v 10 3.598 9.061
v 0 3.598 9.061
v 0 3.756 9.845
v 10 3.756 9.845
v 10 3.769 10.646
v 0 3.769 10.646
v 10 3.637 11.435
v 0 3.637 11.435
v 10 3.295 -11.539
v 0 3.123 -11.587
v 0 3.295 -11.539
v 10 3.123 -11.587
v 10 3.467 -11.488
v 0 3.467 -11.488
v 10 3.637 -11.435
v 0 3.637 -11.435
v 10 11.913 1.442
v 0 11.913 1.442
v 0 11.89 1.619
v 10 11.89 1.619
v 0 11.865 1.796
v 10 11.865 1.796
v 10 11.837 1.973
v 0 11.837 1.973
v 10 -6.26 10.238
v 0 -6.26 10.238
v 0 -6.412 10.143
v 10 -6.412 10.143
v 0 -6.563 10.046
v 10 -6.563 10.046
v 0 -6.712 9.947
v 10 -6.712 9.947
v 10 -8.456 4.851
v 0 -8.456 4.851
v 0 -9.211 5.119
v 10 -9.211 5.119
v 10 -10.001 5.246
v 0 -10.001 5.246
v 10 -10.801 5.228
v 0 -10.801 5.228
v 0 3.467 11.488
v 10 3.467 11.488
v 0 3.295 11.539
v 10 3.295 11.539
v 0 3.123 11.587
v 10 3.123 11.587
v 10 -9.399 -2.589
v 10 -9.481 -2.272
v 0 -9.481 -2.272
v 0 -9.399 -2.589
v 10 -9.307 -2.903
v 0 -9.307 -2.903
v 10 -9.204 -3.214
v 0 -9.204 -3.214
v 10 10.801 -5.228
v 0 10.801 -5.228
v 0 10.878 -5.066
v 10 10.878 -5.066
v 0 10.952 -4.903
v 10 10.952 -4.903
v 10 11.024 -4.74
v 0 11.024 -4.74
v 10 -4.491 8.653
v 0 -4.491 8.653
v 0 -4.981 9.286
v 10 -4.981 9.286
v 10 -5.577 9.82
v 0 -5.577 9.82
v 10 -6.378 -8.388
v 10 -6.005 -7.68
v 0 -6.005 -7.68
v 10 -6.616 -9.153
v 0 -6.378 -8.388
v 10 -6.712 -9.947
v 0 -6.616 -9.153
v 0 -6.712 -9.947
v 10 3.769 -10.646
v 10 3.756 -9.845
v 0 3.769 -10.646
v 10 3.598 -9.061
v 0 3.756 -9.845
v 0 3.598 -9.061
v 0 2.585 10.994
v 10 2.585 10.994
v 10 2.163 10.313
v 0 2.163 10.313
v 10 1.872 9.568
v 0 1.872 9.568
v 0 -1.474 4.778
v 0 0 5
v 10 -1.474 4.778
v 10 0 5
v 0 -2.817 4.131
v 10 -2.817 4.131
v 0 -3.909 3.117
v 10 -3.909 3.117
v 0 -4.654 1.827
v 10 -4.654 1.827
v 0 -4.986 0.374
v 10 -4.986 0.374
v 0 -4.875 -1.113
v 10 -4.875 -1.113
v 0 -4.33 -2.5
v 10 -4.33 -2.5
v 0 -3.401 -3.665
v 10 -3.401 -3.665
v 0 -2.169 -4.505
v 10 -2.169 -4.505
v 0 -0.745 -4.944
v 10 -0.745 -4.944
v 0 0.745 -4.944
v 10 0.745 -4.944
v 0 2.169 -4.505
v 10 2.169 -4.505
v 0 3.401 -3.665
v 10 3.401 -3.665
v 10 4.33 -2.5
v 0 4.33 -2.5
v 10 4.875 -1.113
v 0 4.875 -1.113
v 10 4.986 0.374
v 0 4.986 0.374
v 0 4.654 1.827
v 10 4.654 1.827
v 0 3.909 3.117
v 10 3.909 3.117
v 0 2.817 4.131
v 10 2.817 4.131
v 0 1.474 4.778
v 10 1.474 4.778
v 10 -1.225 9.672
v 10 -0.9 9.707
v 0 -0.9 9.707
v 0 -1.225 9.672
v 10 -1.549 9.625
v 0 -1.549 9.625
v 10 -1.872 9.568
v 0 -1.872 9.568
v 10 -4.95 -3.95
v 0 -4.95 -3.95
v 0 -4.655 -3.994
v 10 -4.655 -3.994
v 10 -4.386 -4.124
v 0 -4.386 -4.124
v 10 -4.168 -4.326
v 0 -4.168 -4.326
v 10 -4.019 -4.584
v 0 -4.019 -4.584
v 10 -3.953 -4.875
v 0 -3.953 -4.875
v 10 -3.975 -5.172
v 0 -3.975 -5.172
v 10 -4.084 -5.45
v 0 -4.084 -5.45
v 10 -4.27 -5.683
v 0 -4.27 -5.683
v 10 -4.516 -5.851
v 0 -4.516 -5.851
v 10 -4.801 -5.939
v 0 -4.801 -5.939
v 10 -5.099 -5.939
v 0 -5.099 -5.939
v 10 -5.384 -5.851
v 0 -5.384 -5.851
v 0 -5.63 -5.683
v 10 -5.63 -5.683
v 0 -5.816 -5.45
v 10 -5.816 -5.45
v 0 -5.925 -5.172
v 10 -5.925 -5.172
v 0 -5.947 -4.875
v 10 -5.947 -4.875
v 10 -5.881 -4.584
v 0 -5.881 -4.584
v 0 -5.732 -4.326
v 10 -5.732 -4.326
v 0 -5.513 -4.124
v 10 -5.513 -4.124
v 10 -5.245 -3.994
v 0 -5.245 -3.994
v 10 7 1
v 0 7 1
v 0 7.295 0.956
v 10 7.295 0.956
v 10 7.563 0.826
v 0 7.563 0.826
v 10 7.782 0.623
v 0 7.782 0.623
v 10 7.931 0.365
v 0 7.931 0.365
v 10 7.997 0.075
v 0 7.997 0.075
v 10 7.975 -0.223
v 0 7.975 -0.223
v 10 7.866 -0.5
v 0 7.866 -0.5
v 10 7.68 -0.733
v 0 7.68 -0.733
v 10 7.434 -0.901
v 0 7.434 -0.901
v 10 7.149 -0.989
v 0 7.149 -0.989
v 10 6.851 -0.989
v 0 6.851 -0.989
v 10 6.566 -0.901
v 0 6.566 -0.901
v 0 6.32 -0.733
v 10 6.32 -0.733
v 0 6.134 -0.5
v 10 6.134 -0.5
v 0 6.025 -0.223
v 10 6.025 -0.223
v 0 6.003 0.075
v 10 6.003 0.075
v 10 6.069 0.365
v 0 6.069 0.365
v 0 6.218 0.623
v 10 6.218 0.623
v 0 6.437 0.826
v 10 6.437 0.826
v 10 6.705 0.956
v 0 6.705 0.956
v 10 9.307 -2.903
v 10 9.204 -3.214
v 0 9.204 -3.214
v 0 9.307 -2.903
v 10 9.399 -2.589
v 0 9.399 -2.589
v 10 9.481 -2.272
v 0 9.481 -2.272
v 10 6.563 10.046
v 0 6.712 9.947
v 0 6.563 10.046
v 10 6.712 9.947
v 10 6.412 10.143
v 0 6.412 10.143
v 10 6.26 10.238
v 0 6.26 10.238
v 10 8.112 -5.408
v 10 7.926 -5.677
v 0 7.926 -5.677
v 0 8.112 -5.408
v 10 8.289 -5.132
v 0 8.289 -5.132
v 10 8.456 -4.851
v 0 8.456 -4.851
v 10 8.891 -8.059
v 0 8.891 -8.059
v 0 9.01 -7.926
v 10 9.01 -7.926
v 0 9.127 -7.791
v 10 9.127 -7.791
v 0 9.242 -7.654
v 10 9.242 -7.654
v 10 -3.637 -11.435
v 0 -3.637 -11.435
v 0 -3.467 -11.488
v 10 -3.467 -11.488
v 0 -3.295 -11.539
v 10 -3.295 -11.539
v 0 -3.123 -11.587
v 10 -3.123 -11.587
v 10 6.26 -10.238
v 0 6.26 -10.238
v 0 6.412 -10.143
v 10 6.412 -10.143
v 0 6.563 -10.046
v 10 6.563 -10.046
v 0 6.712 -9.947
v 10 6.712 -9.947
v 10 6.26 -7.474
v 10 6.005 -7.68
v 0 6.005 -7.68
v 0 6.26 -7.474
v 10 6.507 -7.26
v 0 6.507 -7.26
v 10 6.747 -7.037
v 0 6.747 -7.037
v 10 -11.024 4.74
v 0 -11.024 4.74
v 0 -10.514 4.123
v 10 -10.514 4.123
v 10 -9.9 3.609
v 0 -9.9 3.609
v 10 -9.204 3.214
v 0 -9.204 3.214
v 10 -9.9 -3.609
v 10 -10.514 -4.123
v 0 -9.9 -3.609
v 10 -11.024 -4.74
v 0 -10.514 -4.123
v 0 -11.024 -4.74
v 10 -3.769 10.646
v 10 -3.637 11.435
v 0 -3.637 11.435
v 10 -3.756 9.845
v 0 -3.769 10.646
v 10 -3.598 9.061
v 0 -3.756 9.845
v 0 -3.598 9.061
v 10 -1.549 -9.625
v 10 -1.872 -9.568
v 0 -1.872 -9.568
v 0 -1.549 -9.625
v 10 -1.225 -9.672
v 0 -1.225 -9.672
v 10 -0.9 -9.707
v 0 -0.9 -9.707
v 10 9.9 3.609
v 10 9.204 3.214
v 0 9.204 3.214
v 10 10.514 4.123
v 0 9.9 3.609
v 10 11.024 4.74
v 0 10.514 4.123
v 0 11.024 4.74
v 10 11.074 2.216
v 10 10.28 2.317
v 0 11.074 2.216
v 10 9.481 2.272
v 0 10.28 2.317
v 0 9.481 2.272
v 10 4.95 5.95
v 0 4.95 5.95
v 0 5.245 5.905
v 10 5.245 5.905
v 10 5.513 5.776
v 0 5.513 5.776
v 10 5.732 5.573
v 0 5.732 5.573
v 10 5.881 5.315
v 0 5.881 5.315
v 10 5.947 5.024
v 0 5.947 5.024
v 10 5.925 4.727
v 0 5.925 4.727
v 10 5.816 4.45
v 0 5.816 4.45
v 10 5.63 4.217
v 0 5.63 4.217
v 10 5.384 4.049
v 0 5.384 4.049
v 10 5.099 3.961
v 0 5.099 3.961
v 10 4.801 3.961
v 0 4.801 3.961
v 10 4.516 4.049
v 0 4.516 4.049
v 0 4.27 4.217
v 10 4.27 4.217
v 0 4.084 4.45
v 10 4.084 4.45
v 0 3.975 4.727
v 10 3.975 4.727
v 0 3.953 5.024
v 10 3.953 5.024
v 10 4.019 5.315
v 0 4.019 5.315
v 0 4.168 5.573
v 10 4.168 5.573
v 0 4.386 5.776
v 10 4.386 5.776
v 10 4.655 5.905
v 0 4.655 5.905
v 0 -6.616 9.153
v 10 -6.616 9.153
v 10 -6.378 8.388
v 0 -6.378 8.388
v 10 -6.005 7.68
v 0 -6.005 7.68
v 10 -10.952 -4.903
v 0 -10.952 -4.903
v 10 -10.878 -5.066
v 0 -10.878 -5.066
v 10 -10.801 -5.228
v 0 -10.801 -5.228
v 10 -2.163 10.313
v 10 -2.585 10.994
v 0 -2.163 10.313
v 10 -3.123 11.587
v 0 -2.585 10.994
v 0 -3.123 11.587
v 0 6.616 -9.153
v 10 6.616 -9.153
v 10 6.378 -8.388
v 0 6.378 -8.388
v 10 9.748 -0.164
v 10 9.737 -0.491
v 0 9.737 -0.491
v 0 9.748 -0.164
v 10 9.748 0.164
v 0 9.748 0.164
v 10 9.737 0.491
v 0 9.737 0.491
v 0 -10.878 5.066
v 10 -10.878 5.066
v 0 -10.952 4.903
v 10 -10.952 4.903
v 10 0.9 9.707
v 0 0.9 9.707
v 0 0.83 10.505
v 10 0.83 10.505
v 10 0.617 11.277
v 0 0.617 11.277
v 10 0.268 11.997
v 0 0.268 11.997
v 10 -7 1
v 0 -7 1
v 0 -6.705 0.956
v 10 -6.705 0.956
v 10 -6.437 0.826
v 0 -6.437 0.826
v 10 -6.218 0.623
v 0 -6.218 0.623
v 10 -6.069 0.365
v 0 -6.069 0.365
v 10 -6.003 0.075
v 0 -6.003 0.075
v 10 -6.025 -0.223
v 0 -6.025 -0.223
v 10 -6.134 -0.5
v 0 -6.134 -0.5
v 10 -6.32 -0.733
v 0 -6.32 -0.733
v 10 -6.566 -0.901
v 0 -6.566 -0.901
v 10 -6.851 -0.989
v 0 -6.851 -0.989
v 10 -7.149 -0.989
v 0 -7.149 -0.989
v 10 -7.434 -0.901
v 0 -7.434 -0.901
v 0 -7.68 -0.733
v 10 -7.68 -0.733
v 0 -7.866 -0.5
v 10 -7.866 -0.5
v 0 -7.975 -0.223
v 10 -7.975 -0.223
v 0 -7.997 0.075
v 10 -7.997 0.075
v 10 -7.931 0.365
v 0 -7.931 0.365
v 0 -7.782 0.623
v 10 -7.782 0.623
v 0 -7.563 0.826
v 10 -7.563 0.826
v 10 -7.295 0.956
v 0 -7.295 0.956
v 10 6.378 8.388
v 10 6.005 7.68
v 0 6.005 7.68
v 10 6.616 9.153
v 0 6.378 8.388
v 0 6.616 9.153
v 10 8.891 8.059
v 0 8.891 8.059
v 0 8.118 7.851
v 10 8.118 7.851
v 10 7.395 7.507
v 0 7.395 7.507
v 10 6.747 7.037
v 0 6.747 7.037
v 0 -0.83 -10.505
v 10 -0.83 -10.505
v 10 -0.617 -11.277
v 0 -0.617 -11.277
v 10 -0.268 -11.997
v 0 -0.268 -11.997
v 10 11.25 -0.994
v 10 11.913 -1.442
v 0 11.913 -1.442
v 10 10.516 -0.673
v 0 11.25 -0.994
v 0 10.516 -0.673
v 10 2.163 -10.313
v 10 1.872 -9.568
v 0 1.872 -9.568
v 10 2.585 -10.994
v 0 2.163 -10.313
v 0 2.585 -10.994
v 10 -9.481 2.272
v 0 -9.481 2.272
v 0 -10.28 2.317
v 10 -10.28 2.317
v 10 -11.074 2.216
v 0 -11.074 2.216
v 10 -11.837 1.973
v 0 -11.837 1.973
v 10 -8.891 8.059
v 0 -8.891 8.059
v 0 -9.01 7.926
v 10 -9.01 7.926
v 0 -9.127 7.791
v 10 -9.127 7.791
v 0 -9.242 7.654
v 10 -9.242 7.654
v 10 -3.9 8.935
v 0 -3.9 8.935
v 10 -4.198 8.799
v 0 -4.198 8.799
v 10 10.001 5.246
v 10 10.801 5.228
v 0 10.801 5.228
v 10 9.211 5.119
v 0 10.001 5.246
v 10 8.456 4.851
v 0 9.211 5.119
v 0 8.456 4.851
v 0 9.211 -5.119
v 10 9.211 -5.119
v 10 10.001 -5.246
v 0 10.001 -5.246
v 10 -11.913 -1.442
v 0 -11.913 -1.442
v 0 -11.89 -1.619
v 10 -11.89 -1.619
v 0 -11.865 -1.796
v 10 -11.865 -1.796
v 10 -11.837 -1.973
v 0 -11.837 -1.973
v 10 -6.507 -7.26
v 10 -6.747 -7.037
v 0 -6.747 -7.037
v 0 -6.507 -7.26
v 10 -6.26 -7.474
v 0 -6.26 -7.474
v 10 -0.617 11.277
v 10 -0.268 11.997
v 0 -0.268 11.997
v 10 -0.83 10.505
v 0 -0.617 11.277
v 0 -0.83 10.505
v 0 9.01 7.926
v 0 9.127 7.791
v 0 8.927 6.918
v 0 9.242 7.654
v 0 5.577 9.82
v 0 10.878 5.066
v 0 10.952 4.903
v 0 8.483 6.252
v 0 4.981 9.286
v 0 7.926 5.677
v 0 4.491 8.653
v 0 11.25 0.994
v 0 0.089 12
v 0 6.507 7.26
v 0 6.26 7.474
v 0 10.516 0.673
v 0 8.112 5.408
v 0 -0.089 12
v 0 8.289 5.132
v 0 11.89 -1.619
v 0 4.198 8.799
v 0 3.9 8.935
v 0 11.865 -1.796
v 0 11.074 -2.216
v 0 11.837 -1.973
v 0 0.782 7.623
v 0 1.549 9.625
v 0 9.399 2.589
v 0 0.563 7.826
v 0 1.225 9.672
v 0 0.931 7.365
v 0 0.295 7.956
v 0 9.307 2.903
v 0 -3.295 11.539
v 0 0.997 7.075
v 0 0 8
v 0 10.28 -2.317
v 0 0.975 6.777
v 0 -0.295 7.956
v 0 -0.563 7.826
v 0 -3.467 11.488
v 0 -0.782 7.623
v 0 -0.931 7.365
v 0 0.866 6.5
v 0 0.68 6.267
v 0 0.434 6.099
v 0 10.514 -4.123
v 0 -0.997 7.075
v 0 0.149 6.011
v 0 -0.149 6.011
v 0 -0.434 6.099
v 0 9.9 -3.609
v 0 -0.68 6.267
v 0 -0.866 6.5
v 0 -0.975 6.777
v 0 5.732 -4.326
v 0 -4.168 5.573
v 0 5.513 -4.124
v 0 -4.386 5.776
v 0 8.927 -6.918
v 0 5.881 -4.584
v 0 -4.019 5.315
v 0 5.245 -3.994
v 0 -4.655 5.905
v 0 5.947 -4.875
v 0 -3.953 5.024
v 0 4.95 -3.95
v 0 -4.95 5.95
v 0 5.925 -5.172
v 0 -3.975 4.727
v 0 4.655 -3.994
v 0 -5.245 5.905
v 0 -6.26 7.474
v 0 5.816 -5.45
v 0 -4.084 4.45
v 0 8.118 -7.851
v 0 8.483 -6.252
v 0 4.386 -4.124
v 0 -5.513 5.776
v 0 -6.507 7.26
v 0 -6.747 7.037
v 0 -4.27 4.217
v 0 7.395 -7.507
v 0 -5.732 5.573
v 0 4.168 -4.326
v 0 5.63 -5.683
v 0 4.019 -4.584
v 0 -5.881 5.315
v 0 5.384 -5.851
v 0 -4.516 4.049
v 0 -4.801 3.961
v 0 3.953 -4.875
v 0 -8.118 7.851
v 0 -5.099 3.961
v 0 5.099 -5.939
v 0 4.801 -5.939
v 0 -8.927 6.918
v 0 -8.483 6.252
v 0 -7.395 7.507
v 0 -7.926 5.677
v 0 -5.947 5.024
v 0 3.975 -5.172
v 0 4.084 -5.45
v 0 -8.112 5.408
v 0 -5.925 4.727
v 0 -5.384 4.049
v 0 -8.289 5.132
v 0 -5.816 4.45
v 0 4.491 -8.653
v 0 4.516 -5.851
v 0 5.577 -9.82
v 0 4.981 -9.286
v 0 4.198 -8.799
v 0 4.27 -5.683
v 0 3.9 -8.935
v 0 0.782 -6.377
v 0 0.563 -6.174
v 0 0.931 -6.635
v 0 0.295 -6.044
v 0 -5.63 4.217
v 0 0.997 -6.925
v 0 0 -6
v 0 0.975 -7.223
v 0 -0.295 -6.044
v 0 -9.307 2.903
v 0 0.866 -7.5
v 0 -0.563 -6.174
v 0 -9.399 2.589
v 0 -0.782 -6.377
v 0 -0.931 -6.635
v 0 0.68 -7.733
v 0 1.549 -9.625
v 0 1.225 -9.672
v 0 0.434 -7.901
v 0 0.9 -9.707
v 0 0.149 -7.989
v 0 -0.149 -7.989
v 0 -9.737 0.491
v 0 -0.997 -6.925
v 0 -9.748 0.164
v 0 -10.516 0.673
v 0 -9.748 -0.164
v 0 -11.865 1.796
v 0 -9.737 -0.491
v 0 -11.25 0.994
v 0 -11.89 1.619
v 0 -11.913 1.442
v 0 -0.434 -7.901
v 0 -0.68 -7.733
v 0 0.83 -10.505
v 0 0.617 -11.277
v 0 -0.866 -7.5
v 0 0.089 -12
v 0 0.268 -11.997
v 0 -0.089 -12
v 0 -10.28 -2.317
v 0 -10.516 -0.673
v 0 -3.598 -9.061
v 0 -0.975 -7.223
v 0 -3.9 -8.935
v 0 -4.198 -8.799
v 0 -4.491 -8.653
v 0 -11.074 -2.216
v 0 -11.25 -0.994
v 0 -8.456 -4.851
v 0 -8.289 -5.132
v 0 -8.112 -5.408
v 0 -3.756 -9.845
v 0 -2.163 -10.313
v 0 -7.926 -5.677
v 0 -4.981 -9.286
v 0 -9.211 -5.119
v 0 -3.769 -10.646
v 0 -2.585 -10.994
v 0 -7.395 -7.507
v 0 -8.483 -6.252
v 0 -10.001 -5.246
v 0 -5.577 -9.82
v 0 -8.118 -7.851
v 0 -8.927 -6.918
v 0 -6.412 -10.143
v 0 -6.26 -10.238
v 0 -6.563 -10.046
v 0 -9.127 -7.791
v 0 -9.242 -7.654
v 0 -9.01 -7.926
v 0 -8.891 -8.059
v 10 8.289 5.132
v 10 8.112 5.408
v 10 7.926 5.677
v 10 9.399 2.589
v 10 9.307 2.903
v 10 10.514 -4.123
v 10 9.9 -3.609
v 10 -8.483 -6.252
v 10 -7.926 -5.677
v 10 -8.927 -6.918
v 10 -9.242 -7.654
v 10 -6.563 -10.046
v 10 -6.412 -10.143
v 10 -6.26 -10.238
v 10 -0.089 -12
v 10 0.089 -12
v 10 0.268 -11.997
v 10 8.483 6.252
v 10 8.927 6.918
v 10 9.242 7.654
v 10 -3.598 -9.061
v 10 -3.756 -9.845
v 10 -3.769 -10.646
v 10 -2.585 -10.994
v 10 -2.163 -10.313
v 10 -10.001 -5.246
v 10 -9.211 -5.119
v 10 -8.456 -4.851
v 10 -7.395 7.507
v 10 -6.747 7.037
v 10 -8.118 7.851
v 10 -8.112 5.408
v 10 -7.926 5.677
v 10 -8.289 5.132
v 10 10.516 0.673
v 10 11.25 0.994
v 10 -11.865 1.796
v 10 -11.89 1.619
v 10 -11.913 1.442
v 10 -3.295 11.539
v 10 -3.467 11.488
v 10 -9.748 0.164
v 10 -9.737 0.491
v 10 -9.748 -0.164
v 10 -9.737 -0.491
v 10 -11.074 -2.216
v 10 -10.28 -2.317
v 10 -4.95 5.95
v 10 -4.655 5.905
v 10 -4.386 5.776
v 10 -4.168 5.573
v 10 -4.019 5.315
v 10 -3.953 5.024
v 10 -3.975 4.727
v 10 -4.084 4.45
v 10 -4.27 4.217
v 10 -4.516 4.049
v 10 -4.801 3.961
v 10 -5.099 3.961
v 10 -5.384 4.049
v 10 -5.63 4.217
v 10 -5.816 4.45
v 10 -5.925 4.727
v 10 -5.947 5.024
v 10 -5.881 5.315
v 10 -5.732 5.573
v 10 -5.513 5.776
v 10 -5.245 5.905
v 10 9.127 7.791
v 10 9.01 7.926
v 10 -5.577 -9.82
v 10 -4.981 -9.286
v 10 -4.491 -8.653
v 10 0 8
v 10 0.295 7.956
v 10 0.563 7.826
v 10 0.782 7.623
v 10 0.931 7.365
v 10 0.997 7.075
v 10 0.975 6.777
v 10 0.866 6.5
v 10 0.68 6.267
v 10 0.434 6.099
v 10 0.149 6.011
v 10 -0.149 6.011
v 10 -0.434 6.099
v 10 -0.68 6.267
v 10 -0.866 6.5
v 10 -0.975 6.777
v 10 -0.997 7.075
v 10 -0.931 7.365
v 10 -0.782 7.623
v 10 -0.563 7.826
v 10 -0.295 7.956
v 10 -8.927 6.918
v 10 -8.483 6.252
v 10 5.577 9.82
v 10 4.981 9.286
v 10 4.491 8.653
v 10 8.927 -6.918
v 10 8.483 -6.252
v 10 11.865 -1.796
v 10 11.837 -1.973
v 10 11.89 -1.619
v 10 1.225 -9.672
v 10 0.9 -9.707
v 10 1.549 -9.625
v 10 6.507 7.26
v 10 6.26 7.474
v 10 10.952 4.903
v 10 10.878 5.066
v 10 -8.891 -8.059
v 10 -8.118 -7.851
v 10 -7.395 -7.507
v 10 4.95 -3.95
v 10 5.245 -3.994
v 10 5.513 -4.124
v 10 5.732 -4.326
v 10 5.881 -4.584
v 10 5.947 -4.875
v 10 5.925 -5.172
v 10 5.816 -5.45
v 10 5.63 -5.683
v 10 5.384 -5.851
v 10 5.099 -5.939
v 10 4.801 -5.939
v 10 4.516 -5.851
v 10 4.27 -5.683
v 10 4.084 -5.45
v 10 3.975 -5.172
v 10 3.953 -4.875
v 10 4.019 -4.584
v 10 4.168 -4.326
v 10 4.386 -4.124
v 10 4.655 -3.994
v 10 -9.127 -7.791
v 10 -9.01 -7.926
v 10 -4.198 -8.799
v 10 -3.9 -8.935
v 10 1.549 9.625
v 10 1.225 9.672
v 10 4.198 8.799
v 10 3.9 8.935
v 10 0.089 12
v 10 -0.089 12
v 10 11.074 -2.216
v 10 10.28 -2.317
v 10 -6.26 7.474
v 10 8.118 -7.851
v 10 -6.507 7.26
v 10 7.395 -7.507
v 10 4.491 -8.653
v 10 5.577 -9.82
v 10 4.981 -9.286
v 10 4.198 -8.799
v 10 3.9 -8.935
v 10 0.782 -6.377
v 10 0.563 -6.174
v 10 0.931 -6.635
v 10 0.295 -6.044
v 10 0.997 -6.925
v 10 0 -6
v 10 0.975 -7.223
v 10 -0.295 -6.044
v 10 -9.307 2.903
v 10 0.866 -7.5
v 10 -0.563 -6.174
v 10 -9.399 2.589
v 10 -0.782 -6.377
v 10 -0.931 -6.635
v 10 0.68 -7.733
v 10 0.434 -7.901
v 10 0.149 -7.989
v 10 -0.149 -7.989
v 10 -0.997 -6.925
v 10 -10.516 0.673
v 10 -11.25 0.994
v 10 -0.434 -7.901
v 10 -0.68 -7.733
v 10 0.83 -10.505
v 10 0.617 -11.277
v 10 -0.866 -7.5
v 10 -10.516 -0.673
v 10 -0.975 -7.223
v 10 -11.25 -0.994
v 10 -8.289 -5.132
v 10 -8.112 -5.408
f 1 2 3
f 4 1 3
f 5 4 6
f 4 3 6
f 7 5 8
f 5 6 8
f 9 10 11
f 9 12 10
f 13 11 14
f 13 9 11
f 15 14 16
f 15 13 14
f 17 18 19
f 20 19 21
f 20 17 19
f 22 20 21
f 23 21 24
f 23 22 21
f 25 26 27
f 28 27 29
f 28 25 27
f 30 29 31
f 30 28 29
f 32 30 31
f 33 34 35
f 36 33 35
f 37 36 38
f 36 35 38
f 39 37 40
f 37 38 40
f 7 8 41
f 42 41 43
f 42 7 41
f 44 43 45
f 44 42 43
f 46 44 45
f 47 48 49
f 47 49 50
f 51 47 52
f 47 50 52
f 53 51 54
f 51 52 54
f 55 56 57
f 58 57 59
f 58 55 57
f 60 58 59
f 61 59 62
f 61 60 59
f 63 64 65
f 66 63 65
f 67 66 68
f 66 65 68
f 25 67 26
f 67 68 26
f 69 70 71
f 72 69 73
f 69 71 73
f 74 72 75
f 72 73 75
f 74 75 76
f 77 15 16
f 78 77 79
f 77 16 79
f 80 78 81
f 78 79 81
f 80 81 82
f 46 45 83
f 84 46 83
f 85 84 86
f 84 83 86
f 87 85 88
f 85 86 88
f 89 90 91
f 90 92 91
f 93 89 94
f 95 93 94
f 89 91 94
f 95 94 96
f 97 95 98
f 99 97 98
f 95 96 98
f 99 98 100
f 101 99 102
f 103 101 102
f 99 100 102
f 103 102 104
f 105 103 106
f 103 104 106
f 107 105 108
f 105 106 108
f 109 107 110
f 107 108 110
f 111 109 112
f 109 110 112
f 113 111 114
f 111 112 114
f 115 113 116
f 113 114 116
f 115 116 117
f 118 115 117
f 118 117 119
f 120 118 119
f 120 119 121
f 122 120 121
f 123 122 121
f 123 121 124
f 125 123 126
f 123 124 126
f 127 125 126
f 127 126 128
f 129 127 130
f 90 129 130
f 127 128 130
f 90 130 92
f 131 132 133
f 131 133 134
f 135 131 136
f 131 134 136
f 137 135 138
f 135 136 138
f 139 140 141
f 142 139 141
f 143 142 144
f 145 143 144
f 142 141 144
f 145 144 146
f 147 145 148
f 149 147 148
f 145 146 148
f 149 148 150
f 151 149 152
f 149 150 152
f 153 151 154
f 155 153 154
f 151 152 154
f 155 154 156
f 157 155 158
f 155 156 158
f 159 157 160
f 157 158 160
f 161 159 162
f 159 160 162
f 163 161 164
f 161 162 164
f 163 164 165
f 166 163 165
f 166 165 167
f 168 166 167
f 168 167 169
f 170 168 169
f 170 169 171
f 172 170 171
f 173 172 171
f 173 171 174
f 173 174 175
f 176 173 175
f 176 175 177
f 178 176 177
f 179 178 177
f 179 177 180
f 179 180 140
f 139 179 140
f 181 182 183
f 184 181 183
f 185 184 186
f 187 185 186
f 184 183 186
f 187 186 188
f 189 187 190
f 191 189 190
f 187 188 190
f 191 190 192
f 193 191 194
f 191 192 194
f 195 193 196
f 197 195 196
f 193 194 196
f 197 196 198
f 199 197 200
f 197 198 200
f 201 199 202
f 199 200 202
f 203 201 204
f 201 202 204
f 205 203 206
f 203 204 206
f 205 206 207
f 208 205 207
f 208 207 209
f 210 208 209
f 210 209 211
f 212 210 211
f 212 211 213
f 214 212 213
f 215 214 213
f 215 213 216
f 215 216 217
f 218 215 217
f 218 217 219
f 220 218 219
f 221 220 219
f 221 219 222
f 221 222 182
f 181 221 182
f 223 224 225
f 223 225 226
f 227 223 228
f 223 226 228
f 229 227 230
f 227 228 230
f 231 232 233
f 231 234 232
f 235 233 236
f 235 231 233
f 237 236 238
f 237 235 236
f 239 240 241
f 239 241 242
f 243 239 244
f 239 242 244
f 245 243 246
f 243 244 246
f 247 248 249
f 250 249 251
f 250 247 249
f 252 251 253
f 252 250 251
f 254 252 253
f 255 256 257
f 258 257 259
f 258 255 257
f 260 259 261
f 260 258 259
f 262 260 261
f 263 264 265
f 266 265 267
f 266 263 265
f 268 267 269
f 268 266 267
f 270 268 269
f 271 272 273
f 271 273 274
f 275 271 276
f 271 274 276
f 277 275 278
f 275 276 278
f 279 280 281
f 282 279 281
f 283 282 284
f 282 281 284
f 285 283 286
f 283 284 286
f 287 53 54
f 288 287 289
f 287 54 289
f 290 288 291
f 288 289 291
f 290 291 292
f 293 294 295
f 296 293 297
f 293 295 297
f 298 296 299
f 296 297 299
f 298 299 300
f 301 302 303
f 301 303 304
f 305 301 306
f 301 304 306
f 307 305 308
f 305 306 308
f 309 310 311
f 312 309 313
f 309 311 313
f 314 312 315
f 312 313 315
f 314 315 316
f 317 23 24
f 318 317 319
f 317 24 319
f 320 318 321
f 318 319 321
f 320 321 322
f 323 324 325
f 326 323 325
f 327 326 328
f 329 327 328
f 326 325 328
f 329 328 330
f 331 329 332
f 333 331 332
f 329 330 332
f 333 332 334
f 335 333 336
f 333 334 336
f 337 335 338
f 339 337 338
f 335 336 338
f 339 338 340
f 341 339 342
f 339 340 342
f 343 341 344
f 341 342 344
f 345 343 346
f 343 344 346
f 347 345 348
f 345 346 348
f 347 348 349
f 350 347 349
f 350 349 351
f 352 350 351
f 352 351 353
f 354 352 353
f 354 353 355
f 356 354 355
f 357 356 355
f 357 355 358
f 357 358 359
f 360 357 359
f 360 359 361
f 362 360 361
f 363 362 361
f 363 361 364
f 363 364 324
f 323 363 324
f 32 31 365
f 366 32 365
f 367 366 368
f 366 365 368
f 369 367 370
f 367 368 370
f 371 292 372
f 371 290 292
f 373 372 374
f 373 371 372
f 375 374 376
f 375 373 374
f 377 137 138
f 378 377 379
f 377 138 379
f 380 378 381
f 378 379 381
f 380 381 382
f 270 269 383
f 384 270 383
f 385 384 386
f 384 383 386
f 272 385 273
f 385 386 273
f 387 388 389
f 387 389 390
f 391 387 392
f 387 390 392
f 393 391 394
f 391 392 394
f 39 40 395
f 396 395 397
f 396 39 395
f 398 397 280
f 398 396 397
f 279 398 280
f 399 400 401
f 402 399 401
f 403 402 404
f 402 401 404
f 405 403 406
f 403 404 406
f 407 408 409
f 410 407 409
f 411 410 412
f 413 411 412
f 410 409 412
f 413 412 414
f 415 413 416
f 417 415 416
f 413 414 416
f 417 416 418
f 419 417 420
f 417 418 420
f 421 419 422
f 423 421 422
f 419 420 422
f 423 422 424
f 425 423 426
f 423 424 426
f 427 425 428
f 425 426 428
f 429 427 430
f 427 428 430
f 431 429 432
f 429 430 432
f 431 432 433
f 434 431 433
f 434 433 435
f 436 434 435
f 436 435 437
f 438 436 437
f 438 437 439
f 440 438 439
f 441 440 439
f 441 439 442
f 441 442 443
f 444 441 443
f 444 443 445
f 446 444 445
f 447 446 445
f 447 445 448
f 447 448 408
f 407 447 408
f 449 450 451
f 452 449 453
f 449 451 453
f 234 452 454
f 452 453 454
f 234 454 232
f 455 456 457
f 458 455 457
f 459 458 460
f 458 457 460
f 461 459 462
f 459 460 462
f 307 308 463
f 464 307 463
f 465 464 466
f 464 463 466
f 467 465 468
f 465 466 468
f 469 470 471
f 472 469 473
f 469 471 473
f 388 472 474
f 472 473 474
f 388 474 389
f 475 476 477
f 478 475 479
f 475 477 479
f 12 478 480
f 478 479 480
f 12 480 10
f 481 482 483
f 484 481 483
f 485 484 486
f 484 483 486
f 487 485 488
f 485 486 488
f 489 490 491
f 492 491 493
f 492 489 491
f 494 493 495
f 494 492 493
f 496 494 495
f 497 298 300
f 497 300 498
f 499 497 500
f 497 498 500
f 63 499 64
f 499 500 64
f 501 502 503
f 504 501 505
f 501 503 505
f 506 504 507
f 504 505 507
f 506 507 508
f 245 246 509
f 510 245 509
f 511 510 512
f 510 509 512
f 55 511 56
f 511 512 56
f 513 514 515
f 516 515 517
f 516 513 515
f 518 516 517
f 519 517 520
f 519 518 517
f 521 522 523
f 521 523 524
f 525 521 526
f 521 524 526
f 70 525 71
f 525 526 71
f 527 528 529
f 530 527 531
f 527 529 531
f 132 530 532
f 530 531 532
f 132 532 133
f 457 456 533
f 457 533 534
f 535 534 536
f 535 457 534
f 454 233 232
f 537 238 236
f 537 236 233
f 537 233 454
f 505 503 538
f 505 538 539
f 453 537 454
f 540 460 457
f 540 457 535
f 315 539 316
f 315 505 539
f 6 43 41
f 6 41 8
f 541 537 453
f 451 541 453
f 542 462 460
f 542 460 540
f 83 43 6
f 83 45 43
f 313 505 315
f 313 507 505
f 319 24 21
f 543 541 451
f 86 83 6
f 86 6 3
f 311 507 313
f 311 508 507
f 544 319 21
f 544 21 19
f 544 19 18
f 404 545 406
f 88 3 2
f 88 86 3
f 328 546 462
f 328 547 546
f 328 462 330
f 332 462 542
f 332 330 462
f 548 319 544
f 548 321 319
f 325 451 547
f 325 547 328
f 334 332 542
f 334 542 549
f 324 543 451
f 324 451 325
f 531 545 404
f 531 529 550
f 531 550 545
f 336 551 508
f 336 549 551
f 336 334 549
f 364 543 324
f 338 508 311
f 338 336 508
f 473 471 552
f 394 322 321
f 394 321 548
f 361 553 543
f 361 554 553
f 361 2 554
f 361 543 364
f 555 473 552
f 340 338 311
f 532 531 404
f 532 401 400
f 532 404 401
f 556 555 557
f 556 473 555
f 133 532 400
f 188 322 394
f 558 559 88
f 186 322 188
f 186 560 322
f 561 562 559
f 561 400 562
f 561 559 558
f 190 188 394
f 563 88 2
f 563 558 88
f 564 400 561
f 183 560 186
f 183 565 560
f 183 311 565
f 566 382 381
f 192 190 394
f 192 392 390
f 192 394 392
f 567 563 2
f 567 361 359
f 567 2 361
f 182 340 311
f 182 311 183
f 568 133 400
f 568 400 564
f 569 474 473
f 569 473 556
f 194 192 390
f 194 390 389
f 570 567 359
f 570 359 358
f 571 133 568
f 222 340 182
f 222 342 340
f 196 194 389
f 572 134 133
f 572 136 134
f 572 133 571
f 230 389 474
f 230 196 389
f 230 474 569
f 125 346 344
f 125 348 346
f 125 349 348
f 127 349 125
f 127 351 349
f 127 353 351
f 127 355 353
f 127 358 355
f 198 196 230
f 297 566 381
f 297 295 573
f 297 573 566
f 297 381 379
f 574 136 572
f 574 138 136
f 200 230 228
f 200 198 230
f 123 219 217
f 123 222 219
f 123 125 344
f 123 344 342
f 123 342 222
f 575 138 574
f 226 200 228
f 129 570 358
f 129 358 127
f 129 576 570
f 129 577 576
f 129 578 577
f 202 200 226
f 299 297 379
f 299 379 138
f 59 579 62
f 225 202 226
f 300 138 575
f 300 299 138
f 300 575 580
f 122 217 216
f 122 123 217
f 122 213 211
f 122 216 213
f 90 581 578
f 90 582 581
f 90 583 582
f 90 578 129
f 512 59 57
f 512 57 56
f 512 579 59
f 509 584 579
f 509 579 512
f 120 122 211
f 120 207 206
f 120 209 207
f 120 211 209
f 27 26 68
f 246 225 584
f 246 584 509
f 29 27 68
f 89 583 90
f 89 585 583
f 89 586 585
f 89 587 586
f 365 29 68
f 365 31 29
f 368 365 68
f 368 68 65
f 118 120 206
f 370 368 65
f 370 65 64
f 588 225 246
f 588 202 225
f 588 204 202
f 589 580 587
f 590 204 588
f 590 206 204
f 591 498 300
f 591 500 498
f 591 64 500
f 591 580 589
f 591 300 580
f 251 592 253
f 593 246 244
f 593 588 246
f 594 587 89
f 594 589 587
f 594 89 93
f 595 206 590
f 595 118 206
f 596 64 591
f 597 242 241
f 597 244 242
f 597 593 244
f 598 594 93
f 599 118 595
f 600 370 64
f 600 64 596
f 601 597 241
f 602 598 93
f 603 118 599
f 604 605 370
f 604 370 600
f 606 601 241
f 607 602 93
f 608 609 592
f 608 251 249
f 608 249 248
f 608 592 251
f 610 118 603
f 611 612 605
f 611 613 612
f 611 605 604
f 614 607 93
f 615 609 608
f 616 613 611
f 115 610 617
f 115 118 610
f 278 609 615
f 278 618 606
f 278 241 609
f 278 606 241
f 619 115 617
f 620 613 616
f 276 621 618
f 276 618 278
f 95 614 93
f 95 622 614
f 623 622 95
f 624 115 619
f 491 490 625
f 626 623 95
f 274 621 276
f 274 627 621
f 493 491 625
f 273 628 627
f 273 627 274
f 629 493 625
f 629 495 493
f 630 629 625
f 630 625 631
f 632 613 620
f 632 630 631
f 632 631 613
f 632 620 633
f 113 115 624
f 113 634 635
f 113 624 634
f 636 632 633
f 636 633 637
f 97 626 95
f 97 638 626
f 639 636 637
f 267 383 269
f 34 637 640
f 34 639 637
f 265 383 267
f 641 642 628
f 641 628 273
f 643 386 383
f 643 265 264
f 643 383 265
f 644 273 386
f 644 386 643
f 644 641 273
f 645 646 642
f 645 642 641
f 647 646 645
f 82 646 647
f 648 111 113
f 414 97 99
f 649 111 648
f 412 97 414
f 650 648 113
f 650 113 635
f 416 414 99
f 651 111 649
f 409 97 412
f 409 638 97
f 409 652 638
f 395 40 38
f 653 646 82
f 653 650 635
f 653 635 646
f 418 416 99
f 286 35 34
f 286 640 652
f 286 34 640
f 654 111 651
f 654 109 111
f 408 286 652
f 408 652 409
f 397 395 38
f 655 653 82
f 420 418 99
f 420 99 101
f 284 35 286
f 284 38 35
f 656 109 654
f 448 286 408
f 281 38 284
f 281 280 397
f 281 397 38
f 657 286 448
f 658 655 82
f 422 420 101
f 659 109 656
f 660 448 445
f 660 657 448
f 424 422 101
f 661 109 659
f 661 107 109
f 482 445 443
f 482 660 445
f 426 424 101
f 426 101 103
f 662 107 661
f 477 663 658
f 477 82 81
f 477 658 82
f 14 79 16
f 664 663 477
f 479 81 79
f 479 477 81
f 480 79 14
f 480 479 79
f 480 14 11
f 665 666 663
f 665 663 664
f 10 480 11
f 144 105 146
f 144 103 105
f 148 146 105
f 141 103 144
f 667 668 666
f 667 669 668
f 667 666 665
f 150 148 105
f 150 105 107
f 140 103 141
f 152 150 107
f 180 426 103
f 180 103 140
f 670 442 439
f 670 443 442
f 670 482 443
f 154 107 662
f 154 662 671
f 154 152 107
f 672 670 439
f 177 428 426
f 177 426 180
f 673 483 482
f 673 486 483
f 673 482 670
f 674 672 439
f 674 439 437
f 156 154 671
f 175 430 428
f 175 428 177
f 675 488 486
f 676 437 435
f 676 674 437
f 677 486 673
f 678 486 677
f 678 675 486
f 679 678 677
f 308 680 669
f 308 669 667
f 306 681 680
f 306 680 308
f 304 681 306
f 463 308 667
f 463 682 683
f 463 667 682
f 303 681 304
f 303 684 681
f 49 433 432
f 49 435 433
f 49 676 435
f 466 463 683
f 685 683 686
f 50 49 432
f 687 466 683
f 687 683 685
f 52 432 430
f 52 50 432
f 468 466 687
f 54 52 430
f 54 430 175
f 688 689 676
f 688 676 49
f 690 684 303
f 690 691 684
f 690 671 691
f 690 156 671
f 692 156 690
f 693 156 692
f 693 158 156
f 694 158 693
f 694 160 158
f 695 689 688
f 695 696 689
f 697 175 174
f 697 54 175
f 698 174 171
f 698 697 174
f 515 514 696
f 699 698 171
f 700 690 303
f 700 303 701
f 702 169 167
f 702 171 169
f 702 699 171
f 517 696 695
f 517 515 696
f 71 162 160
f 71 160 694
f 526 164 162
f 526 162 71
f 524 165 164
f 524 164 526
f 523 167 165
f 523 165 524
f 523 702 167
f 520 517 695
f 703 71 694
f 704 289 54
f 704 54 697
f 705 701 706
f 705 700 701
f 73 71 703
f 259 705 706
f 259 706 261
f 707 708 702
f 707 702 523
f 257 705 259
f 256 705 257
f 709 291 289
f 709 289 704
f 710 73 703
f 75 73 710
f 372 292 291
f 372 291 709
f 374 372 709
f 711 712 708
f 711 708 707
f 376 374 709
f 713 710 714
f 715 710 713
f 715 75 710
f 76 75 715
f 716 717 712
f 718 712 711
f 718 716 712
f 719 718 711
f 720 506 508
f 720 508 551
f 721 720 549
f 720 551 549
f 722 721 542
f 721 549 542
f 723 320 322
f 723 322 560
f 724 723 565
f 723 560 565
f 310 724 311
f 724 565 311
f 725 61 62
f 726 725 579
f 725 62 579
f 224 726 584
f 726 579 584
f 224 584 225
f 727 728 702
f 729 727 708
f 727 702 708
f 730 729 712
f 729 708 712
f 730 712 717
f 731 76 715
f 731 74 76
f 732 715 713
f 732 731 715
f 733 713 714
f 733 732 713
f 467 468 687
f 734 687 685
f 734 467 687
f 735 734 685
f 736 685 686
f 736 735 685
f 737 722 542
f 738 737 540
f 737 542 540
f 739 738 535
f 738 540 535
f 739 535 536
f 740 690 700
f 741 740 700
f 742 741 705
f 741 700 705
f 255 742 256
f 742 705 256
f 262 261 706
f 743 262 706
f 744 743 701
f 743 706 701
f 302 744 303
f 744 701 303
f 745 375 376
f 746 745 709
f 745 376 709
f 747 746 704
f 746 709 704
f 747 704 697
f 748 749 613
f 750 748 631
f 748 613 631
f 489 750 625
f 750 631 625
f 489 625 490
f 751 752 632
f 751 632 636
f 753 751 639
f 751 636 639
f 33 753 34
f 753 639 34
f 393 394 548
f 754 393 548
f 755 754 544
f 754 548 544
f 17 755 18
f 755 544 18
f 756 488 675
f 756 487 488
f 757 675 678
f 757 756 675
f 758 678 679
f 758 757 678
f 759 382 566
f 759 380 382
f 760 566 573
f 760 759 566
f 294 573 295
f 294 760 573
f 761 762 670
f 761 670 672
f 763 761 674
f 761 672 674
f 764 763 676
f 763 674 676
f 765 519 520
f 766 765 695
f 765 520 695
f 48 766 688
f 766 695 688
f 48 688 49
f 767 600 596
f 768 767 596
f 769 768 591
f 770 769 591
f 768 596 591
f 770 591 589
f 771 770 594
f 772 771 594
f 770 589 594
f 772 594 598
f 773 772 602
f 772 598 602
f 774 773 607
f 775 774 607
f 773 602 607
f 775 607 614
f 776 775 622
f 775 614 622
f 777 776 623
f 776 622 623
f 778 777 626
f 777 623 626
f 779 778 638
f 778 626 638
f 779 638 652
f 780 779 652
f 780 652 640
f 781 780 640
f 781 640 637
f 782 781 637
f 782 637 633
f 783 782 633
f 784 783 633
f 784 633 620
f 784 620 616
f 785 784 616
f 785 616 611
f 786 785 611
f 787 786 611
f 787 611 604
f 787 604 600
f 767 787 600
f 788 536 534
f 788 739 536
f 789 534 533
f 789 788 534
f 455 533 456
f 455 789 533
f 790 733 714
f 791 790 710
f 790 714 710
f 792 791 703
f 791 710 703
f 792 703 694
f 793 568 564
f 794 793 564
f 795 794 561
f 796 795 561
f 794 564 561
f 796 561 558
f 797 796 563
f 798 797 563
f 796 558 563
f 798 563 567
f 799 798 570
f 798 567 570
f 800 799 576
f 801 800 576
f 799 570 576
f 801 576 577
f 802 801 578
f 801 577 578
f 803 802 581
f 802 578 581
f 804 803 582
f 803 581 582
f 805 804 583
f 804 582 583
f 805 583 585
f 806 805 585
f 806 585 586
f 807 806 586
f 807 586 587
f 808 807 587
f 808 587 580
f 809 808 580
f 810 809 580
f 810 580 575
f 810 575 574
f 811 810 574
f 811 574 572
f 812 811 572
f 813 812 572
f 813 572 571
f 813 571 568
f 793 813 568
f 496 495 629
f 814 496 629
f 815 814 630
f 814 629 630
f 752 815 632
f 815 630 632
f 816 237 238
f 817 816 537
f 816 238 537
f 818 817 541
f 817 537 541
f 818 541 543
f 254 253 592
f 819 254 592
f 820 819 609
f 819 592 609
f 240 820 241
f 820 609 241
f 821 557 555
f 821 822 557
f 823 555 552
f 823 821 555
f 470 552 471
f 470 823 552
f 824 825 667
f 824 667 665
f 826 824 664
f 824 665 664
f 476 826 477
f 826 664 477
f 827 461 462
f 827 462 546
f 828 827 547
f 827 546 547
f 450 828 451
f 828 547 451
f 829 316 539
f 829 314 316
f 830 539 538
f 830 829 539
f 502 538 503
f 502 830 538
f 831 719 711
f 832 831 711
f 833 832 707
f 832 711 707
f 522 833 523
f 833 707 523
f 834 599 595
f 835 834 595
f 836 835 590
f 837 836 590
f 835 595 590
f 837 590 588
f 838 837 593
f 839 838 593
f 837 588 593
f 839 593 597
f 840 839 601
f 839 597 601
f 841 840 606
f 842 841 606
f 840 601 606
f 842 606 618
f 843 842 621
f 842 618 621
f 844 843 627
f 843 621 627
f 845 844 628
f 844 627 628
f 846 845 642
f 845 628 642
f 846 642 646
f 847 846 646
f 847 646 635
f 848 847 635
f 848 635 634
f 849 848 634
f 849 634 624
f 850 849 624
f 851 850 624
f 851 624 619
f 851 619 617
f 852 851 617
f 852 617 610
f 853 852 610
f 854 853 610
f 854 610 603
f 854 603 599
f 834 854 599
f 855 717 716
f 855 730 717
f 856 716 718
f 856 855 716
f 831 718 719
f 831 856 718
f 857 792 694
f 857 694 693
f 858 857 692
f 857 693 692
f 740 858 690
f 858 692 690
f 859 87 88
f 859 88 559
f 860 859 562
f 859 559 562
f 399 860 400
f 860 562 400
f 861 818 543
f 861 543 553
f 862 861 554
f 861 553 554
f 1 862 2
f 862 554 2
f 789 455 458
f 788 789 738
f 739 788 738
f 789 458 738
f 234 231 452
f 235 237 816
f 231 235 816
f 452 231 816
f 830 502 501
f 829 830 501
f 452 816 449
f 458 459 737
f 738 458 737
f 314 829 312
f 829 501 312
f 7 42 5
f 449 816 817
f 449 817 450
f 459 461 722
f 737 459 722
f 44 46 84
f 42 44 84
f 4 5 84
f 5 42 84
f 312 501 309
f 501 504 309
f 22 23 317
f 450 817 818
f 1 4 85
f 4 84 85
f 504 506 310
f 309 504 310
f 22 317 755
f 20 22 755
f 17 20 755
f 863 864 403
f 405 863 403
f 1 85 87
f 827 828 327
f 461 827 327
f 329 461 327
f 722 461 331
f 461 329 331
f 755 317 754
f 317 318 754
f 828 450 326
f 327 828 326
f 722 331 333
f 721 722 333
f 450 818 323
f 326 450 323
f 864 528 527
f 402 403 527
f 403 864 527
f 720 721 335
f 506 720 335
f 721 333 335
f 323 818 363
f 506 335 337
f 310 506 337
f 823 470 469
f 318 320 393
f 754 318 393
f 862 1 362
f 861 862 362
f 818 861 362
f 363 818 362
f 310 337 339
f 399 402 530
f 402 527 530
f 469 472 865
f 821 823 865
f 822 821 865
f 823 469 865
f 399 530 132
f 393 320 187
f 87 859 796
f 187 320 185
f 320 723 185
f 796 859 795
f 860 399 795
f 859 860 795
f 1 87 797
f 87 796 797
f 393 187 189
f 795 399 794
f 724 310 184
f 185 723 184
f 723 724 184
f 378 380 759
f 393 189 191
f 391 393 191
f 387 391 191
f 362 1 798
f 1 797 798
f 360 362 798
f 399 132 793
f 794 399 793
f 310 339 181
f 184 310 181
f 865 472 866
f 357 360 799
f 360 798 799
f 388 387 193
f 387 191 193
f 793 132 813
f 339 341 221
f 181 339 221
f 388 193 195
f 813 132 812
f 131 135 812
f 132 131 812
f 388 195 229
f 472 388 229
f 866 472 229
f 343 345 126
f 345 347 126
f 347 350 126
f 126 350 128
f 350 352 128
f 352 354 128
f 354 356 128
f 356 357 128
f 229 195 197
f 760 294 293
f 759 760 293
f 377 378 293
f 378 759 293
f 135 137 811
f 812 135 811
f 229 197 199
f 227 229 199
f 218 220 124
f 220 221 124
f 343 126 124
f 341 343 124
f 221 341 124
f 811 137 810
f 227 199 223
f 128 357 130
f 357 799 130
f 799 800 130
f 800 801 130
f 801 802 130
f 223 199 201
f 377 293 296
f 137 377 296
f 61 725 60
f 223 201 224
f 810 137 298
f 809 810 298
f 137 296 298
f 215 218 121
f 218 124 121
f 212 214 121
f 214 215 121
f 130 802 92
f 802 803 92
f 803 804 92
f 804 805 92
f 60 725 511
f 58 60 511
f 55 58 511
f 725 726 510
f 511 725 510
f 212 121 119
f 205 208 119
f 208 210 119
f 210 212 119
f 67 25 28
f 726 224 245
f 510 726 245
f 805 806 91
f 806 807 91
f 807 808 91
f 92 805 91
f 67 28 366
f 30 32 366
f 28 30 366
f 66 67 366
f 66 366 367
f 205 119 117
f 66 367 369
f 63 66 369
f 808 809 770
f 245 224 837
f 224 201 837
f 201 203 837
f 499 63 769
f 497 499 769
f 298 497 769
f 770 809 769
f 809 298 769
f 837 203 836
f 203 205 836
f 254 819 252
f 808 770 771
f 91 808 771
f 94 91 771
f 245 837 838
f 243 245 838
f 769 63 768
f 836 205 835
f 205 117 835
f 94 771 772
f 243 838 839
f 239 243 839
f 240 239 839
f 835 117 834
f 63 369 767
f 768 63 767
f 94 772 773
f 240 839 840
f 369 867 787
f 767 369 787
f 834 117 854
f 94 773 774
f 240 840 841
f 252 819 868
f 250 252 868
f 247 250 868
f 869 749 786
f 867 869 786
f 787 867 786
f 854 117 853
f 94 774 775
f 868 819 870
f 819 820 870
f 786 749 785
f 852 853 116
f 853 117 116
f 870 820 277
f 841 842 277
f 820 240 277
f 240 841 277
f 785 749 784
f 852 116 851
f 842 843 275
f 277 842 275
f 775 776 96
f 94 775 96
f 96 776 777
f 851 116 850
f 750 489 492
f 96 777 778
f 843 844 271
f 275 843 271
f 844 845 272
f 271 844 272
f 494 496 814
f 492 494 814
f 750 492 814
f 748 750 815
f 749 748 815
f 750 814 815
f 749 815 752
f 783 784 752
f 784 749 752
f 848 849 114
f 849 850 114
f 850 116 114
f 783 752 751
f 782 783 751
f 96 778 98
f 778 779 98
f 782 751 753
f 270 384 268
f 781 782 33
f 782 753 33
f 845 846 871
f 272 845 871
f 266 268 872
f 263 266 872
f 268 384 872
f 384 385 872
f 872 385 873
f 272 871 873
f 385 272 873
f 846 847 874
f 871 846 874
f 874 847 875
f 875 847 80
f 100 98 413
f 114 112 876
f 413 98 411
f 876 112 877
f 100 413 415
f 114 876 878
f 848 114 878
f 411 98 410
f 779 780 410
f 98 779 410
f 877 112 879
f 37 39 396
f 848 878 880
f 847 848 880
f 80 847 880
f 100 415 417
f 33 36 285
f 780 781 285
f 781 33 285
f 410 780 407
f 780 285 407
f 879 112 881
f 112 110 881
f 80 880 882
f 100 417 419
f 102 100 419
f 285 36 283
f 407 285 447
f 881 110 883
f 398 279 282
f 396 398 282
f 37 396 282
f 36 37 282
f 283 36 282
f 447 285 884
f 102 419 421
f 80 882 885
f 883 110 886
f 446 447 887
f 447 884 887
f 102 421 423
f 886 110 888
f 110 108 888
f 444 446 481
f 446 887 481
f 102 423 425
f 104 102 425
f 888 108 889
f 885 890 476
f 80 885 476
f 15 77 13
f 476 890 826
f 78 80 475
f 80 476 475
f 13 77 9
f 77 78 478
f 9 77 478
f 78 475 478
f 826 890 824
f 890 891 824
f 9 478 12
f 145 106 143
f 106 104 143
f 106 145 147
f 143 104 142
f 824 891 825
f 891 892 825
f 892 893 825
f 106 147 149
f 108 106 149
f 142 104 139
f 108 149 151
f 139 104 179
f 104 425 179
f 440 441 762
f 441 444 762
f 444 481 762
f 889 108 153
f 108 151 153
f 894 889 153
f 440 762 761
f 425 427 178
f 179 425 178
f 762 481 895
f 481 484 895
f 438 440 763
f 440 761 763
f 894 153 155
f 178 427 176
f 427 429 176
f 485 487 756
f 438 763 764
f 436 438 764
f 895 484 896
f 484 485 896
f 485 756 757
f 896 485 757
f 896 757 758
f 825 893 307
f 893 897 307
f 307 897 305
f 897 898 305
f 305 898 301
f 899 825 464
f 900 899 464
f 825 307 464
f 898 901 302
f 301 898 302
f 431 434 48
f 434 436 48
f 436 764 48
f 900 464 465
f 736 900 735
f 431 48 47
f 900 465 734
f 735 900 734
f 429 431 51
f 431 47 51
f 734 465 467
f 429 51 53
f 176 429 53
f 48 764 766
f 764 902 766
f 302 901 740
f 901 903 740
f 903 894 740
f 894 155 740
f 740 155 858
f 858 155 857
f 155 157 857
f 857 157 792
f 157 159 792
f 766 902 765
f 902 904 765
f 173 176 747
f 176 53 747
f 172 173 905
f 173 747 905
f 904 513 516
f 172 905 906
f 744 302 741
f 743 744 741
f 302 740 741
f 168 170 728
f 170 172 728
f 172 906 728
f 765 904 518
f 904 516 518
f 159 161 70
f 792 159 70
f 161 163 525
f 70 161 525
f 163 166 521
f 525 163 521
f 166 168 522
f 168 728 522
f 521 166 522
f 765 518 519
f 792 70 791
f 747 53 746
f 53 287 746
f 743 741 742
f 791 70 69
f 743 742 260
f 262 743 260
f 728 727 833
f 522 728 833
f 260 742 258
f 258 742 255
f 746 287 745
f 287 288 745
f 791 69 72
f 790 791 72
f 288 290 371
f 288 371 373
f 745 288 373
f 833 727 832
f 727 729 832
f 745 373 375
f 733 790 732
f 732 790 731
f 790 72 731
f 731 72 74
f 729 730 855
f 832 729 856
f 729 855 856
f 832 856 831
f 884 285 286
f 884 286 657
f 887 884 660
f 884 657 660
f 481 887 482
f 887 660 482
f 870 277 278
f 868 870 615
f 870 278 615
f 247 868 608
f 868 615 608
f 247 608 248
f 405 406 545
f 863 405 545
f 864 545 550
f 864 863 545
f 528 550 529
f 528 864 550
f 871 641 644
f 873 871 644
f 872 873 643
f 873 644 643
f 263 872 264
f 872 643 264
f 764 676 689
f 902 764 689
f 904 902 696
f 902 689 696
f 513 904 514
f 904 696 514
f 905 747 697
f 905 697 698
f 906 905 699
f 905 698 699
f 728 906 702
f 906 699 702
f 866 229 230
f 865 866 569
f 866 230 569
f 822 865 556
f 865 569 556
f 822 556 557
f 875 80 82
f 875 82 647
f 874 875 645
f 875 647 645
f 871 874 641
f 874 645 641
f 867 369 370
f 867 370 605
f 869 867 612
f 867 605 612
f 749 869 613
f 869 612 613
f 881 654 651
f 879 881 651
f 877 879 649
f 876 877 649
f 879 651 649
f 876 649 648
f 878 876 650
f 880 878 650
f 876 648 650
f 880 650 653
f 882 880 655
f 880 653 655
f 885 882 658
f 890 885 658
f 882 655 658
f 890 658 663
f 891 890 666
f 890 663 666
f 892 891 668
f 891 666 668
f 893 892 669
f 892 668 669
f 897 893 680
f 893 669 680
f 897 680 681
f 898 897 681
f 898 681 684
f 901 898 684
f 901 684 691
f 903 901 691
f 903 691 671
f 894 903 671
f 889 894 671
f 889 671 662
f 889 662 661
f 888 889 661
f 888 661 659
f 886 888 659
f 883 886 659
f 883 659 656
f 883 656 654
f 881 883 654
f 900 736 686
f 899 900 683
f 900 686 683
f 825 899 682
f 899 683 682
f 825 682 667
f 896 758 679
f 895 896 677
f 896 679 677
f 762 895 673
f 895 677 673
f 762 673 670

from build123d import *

# Parameters (mm, degrees)
BASPROSKE_W          = 10
BASPROSKE_H          = 12
TOOTHCUT_DEPTH       = 20.697715604
TEETHCUTS_COUNT      = 22
TEETHCUTS_ANGLE      = 343.636363636
BORSKE_R             = 5
BORE_DEPTH           = 50.0000508
D_GAGEMENT_M21_D     = 2
D_GAGEMENT_M21_DEPTH = 10


with BuildPart() as part:
    # BasProSke → Base-Revolve (revolve)
    with BuildSketch(Plane(origin=(0, 0, 0), x_dir=(1, 0, 0), z_dir=(0, 1, 0)), mode=Mode.PRIVATE) as base_revolve_sk:
        with Locations((5, 6)):
            Rectangle(BASPROSKE_W, BASPROSKE_H)
    revolve(base_revolve_sk.sketch.rotate(Axis((-10, 0, 0), (1, 0, 0)), 180), axis=Axis((-10, 0, 0), (1, 0, 0)))

    # TooCutSke → ToothCut (cut, through all)
    with BuildSketch(Plane(origin=(0, 0, 0), x_dir=(0, 0, -1), z_dir=(1, 0, 0))):
        with BuildLine():
            ThreePointArc((0.491001901, 9.736627657), (0, 9.749), (-0.491001901, 9.736627657))
            ThreePointArc((-0.491001901, 9.736627657), (-0.822824844, 10.904005344), (-1.46093845, 11.936327074))
            ThreePointArc((-1.46093845, 11.936327074), (0, 12.0254), (1.46093845, 11.936327074))
            ThreePointArc((1.46093845, 11.936327074), (0.822824844, 10.904005344), (0.491001901, 9.736627657))
        make_face()
    toothcut = extrude(amount=TOOTHCUT_DEPTH, mode=Mode.SUBTRACT)

    # TeethCuts: ToothCut ×22 about axis
    teethcuts_axis = Axis((-10, 0, 0), (1, 0, 0))
    for i in range(1, TEETHCUTS_COUNT):
        add(toothcut.rotate(teethcuts_axis, i * TEETHCUTS_ANGLE / (TEETHCUTS_COUNT - 1)), mode=Mode.SUBTRACT)

    # BorSke → Bore (cut, symmetric)
    with BuildSketch(Plane(origin=(0, 0, 0), x_dir=(0, 0, -1), z_dir=(1, 0, 0))):
        with Locations(Location((0, 0, 0), (0, 0, 180))):
            Circle(BORSKE_R)
    extrude(amount=BORE_DEPTH, both=True, mode=Mode.SUBTRACT)

    # Dégagement M21
    with Locations(Plane(origin=(10, 0, 0), x_dir=(0, 0, -1), z_dir=(1, 0, 0))):
        with Locations((0, 7), (4.949747468, 4.949747468), (7, 0), (4.949747468, -4.949747468), (0, -7), (-4.949747468, -4.949747468), (-7, 0), (-4.949747468, 4.949747468), (0, 0)):
            Hole(D_GAGEMENT_M21_D / 2, depth=D_GAGEMENT_M21_DEPTH)


solid = part.part
